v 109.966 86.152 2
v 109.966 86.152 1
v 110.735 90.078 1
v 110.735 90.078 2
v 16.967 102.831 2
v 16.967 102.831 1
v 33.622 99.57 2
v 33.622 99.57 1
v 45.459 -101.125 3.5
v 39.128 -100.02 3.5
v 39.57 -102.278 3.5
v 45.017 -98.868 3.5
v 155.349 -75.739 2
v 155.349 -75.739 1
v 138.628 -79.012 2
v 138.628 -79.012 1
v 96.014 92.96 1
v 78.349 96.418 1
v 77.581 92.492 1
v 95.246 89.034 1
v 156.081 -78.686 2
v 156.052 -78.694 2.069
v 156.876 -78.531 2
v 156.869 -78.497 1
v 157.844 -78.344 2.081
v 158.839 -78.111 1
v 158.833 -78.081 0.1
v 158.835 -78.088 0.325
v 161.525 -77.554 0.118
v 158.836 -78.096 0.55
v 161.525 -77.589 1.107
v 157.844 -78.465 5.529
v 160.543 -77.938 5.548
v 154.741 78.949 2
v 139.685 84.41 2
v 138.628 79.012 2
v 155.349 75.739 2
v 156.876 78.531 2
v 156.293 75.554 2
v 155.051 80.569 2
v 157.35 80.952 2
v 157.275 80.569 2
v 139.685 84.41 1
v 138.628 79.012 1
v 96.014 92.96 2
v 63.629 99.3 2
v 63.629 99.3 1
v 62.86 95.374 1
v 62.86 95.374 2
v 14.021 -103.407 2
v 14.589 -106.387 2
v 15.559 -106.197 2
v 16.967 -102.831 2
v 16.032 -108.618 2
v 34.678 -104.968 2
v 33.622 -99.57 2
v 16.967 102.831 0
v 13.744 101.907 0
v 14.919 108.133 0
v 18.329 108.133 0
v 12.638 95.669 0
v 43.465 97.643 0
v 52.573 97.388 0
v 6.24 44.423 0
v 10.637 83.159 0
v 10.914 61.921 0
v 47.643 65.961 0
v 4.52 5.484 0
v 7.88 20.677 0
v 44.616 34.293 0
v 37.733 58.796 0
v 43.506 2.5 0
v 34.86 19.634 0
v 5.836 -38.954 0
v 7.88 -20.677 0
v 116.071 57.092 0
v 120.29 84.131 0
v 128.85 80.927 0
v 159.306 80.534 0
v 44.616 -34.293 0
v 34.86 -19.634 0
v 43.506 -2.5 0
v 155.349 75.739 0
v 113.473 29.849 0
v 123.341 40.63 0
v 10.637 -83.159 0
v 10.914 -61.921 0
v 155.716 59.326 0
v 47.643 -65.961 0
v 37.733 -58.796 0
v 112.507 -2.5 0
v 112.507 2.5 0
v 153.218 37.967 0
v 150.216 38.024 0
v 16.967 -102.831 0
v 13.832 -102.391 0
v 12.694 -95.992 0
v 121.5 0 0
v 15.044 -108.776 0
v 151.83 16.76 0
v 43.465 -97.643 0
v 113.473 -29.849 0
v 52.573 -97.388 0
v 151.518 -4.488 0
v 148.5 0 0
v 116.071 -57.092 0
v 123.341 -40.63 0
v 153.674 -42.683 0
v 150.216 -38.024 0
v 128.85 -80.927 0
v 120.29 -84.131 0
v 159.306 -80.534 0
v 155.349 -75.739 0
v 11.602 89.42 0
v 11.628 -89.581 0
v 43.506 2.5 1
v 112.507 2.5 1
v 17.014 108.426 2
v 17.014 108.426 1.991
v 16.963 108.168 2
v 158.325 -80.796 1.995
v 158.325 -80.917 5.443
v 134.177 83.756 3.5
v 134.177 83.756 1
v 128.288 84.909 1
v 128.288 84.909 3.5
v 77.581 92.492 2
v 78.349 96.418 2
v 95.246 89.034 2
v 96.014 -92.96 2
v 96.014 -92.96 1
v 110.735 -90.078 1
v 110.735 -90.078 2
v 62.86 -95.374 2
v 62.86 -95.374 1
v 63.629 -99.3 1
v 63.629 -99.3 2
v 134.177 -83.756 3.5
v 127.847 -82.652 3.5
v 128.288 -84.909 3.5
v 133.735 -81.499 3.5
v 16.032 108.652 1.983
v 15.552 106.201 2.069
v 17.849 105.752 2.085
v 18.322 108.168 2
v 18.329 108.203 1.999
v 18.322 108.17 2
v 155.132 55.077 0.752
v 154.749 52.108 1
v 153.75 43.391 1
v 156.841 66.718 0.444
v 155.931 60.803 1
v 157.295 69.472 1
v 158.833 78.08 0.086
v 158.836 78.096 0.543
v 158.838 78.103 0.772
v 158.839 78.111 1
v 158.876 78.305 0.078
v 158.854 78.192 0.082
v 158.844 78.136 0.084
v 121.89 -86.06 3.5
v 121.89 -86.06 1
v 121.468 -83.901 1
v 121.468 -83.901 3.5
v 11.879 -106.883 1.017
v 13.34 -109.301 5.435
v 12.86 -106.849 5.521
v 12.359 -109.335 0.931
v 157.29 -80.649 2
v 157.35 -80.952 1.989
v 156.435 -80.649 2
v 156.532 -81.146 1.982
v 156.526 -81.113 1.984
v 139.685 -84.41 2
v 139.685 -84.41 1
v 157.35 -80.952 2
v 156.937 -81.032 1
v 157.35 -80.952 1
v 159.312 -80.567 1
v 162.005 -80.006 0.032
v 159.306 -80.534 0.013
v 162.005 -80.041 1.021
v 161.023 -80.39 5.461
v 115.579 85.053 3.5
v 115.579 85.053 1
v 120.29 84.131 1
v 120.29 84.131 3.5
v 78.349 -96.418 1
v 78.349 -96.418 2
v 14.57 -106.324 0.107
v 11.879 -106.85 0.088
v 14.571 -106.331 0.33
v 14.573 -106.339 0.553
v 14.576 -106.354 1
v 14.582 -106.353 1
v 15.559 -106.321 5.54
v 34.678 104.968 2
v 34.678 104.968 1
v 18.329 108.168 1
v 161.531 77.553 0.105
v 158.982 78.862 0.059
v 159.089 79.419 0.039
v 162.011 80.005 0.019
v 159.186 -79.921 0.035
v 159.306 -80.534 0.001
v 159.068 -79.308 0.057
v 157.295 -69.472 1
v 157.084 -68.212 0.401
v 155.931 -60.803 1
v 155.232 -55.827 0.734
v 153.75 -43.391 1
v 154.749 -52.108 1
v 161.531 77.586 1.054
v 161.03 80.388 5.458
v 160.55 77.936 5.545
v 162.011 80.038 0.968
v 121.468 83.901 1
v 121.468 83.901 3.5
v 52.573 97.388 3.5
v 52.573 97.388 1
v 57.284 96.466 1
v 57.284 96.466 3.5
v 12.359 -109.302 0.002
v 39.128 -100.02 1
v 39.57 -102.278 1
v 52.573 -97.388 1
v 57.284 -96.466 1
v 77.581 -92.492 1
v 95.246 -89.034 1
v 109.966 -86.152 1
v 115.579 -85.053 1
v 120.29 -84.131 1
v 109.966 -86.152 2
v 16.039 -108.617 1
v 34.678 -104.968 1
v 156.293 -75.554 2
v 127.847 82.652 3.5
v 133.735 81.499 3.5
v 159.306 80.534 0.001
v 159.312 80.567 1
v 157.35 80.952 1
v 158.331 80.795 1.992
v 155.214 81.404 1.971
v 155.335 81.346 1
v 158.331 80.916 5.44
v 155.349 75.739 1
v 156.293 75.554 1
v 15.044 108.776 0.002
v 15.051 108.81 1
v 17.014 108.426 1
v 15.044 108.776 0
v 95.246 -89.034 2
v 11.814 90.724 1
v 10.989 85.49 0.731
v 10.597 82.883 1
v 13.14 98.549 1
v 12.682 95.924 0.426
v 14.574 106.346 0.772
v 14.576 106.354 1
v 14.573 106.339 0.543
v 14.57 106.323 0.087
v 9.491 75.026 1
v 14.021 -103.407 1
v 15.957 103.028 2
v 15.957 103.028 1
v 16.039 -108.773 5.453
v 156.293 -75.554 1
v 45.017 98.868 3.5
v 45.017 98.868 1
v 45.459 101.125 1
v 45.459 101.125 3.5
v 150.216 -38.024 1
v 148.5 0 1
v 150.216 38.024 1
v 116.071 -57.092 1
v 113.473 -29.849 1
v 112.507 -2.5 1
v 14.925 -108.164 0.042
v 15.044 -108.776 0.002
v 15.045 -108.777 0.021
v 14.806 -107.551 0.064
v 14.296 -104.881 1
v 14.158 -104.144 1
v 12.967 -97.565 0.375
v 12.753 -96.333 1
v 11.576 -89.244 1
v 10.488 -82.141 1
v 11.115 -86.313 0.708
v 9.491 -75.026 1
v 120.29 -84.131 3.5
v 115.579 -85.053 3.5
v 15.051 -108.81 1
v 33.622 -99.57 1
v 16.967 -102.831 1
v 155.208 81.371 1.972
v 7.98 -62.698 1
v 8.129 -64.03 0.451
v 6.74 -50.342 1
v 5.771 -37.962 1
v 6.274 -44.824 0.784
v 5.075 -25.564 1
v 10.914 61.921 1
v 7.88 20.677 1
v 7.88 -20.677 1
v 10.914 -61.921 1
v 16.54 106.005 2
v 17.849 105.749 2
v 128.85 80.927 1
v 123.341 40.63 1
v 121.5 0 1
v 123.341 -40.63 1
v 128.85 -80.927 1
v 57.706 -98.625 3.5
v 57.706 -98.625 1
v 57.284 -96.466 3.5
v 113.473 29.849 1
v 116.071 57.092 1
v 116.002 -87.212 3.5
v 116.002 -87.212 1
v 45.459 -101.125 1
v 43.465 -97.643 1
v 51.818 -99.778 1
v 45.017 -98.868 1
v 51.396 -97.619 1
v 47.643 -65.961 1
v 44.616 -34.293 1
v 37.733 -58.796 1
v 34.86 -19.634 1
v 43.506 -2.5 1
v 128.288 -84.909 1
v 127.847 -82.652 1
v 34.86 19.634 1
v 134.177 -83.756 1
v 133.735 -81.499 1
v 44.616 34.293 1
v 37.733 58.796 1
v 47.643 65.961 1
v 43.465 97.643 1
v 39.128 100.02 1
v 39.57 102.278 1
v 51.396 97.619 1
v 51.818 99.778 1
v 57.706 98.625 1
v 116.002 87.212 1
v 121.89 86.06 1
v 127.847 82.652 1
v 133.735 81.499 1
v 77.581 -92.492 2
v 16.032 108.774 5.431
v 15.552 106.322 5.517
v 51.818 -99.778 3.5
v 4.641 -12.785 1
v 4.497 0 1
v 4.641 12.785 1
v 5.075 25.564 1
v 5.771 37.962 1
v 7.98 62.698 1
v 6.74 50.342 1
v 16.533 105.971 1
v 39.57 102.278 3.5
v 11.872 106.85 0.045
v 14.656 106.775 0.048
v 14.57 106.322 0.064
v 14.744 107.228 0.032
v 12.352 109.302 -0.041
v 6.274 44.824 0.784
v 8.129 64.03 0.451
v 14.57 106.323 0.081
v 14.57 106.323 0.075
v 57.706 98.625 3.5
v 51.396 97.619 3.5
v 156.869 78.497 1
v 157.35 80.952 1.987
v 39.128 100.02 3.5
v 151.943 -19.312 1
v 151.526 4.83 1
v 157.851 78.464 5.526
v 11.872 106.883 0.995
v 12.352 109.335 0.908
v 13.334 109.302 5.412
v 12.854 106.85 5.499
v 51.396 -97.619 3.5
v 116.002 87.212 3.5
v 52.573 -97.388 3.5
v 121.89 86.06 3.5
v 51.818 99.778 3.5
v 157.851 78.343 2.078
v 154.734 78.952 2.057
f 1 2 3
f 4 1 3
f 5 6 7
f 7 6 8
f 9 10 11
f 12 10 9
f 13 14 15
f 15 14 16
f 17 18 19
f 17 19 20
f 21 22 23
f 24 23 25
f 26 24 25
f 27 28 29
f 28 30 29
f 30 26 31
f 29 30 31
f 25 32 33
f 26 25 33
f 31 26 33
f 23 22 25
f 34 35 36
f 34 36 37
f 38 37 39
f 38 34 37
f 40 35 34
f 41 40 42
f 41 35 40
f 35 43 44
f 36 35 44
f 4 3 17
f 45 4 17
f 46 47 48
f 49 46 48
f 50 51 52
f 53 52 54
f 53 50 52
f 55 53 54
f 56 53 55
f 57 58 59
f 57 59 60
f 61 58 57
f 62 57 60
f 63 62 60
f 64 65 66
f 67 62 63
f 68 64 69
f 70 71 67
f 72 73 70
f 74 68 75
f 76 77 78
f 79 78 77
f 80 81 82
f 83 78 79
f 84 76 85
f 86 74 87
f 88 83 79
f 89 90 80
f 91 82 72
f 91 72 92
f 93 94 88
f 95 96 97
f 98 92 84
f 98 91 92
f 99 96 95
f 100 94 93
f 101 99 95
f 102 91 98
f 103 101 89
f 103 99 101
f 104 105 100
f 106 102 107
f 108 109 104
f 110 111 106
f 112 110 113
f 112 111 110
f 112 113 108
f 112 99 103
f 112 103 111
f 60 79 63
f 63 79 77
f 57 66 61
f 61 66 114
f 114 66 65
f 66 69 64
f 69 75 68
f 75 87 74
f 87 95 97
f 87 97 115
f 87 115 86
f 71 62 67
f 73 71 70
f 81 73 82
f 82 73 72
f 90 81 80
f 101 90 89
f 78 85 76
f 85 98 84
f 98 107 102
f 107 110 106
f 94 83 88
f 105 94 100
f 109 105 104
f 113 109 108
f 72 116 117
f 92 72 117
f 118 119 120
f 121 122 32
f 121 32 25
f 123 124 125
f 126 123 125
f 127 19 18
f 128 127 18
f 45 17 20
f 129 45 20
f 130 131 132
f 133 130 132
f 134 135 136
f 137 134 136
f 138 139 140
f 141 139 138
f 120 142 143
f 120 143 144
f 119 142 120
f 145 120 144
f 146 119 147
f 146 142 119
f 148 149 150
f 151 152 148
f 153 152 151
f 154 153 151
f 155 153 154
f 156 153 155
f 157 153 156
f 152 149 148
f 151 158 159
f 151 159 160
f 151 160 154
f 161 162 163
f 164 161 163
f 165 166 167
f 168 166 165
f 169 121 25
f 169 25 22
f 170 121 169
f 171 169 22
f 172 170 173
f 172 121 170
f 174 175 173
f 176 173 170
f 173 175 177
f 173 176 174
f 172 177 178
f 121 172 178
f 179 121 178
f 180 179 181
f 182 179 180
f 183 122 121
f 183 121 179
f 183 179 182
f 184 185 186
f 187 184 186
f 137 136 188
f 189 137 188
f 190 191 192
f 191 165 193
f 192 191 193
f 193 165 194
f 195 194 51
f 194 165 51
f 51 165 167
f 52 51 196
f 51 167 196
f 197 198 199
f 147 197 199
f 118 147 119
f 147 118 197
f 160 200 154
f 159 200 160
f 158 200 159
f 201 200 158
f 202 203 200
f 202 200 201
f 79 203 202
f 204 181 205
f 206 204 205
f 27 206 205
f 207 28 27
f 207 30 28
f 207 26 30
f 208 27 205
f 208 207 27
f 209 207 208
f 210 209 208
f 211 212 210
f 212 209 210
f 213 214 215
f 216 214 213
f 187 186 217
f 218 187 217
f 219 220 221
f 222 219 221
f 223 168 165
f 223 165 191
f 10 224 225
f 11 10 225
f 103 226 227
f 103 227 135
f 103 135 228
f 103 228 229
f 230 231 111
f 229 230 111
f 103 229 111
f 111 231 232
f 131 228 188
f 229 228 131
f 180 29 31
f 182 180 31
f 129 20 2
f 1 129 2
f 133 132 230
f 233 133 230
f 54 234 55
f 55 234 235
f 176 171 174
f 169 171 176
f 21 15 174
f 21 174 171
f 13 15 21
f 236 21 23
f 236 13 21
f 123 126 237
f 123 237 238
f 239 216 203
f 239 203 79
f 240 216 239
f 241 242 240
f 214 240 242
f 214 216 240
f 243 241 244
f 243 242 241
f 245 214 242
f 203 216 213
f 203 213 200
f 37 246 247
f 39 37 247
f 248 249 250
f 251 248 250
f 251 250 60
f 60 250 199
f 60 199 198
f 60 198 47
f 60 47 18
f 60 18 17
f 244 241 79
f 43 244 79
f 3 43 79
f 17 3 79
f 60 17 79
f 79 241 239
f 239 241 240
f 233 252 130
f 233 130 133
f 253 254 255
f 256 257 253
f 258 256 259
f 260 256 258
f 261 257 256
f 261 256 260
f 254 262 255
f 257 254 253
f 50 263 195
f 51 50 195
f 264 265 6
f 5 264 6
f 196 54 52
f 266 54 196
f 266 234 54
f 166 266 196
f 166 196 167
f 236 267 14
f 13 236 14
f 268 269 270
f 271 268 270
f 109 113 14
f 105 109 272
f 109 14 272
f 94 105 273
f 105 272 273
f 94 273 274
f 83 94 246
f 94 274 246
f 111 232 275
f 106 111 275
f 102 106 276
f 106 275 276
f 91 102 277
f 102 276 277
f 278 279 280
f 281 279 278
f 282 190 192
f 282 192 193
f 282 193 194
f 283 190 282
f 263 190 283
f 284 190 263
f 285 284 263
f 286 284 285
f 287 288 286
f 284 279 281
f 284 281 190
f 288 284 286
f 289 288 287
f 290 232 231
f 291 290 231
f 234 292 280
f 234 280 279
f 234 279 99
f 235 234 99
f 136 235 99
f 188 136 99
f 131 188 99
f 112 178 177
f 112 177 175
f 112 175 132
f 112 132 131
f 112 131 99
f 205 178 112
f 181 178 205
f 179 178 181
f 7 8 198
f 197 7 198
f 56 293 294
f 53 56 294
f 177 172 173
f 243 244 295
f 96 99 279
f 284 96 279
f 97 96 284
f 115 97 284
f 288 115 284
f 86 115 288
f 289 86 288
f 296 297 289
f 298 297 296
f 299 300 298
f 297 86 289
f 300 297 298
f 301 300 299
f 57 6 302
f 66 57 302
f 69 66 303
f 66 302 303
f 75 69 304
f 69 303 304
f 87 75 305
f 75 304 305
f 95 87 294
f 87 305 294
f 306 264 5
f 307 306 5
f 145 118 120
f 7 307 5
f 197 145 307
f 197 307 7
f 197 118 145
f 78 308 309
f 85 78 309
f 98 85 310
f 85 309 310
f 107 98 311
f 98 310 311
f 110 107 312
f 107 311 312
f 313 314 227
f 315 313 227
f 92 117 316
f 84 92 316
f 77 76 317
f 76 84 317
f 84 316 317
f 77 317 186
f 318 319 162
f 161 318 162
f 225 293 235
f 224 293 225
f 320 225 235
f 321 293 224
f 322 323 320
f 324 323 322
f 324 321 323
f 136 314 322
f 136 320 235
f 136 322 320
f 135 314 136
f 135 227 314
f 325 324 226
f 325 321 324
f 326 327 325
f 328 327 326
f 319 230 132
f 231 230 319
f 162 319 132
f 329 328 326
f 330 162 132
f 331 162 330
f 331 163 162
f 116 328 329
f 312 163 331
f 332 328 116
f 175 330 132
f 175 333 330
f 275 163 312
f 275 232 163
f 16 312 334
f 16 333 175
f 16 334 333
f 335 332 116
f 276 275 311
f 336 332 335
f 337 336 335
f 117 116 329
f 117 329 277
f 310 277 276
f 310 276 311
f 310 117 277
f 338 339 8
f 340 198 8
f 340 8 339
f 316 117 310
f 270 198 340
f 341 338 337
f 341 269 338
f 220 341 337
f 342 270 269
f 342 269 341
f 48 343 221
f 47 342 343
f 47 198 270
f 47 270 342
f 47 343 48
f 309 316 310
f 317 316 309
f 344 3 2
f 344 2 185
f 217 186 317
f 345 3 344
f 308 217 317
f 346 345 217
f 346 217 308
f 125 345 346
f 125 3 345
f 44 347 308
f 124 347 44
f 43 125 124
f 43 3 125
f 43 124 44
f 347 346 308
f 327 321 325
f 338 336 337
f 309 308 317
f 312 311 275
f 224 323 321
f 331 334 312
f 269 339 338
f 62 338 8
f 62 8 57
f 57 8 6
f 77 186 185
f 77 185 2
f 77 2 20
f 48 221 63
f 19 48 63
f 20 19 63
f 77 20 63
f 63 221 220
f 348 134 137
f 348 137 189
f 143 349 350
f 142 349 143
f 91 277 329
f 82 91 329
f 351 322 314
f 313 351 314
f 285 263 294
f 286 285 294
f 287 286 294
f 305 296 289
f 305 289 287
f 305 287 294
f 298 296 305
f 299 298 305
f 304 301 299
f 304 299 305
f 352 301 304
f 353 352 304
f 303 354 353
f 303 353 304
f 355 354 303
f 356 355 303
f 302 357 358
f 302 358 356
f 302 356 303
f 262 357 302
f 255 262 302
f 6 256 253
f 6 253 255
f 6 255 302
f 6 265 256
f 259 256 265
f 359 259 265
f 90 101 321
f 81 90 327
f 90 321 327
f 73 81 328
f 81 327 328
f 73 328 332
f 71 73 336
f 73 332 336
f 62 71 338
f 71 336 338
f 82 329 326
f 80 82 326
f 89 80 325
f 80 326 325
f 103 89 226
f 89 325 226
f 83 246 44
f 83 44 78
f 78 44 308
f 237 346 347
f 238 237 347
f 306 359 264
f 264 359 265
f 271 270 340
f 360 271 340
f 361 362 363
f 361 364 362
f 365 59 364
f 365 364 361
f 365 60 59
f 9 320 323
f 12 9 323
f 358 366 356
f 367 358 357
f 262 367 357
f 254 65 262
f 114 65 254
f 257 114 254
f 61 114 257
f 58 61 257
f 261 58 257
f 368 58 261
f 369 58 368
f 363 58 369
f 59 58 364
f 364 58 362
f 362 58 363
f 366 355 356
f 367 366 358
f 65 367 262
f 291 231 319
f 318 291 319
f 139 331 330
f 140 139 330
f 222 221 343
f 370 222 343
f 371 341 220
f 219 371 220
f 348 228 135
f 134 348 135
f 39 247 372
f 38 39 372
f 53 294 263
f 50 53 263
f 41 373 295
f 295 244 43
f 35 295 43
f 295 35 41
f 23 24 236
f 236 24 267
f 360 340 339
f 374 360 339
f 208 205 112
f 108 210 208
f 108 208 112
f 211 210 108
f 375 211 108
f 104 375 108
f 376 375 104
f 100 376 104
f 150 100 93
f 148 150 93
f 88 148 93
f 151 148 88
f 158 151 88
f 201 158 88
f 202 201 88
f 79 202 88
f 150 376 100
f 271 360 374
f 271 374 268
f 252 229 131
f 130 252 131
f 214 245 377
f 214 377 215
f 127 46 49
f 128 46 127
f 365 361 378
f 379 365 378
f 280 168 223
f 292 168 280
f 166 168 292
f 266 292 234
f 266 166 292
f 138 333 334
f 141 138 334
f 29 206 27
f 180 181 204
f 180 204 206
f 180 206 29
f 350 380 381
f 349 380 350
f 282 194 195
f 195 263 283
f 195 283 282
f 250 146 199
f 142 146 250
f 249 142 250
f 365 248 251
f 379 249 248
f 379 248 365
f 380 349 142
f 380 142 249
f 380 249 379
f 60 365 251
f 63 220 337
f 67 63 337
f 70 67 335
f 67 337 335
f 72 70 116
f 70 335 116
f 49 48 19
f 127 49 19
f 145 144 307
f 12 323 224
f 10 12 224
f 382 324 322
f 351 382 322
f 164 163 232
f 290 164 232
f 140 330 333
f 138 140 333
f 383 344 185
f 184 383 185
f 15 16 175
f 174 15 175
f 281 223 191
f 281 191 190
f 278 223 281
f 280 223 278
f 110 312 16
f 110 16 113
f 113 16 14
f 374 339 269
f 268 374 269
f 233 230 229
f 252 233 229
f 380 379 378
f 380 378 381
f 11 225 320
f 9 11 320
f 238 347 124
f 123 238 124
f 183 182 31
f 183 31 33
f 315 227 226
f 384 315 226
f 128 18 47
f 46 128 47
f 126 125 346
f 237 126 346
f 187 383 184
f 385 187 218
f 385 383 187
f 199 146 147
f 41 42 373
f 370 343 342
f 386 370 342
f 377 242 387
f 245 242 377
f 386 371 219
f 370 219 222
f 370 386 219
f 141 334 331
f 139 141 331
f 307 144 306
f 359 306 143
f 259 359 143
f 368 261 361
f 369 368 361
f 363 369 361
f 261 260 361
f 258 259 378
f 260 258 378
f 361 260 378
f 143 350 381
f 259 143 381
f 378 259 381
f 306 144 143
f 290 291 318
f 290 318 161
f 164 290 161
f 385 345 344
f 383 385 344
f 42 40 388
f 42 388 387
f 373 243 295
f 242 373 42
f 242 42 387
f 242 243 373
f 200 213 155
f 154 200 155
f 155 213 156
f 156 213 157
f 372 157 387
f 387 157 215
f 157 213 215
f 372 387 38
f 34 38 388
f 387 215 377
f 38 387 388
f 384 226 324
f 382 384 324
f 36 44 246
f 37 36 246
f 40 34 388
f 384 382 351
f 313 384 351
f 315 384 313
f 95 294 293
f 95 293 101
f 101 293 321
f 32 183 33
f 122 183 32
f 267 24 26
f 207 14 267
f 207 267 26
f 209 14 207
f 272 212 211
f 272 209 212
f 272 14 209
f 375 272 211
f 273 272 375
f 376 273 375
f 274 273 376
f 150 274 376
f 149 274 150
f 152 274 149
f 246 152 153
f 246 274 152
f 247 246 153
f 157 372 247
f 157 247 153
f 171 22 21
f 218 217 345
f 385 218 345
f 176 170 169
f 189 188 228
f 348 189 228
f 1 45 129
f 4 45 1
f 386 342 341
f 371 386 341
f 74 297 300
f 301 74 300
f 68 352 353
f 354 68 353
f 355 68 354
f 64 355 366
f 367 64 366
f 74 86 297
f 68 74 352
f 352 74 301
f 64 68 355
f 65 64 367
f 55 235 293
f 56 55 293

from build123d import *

# Parameters (mm, degrees)
F1_ANGLE_BACK = 11.25
F1_ANGLE      = 22.5
F2_W          = 174.6602954563
F2_H          = 13.9838710204
F2_W_2        = 174.5945907282
F2_H_2        = 12.7738052979
F3_DEPTH      = 125
F5_DEPTH      = 1.001
F7_DEPTH      = 2.5
F9_DEPTH      = 1
F11_DEPTH     = 2.5
F13_DEPTH     = 2.5


with BuildPart() as f1:
    # F0 (on Front) → F1 (revolve)
    with BuildSketch(Plane.XZ, mode=Mode.PRIVATE) as f1_sk:
        Polygon((4.5, 1.8972494266), (151.4991241063, 1.4046487898), (151.5292833394, 10.4045982575), (4.530159233, 10.8971988943), align=None)
        Polygon((151.4689648733, -7.5953006778), (151.4991241063, 1.4046487898), (4.5, 1.8972494266), (4.4973410418, 1.1037780134), (51.0110905605, -7.2586618498), align=None)
        Polygon((4.469840767, -7.102700041), (51.0110905605, -7.2586618498), (4.4973410418, 1.1037780134), align=None)
    revolve(f1_sk.sketch.rotate(Axis((561.8991869329, 0, -48.7660320647), (-0.176947319, 0, -0.9842203241)), -F1_ANGLE_BACK), axis=Axis((561.8991869329, 0, -48.7660320647), (-0.176947319, 0, -0.9842203241)), revolution_arc=F1_ANGLE)

    # F2 (on Front) → F3 (cut, symmetric)
    with BuildSketch(Plane.XZ):
        with Locations((82.9434095772, 7.9919355102)):
            Rectangle(F2_W, F2_H)
        with Locations((82.9762619412, -6.386902649)):
            Rectangle(F2_W_2, F2_H_2)
    extrude(amount=F3_DEPTH, both=True, mode=Mode.SUBTRACT)

    # F4 (on face) → F5 (cut, through all)
    with BuildSketch(Plane.XY.offset(1)):
        with BuildLine():
            Line((43.4654092359, 97.642850746), (16.9671003359, 102.8305199324))
            ThreePointArc((16.9671003359, 102.8305199324), (7.5, 0), (16.9671003359, -102.8305199324))
            Line((16.9671003359, -102.8305199324), (43.4654092359, -97.642850746))
            ThreePointArc((43.4654092359, -97.642850746), (34.5, 0), (43.4654092359, 97.642850746))
        make_face()
        with BuildLine():
            Line((120.2899679019, 84.1311059323), (52.5732132725, 97.3882584065))
            ThreePointArc((52.5732132725, 97.3882584065), (45.8906345723, 50.1494761623), (43.5059275751, 2.5))
            Line((43.5059275751, 2.5), (112.5068202166, 2.5))
            ThreePointArc((112.5068202166, 2.5), (114.5685951129, 43.4900158167), (120.2899679019, 84.1311059323))
        make_face()
        with BuildLine():
            Line((112.5068202166, -2.5), (43.5059275751, -2.5))
            ThreePointArc((43.5059275751, -2.5), (45.8906345723, -50.1494761623), (52.5732132725, -97.3882584065))
            Line((52.5732132725, -97.3882584065), (120.2899679019, -84.1311059323))
            ThreePointArc((120.2899679019, -84.1311059323), (114.5685951129, -43.4900158167), (112.5068202166, -2.5))
        make_face()
        with BuildLine():
            Line((155.3490104822, 75.7389959439), (128.8499233765, 80.9268174824))
            ThreePointArc((128.8499233765, 80.9268174824), (121.5, 0), (128.8499233765, -80.9268174824))
            Line((128.8499233765, -80.9268174824), (155.3490104822, -75.7389959439))
            ThreePointArc((155.3490104822, -75.7389959439), (148.5, 0), (155.3490104822, 75.7389959439))
        make_face()
    extrude(amount=-F5_DEPTH, mode=Mode.SUBTRACT)

    # F6 (on face) → F7 (join)
    with BuildSketch(Plane.XY.offset(1)):
        Polygon((45.0166627785, 98.8676314601), (45.4585534309, 101.1247829063), (39.5703322667, 102.2775411299), (39.1284416144, 100.0203896837), align=None)
        Polygon((52.5732132725, 97.3882584065), (57.2837902038, 96.4660518276), (57.7064682191, 98.6250662544), (51.818247055, 99.777824478), (51.3955690397, 97.6188100512), align=None)
        Polygon((116.0020689859, 87.2123269381), (115.5793909706, 85.0533125112), (120.2899679019, 84.1311059323), (121.4676121347, 83.9005542876), (121.8902901501, 86.0595687145), align=None)
        Polygon((128.2884090483, 84.908884325), (127.8465183959, 82.6517328787), (133.7347395601, 81.4989746551), (134.1766302124, 83.7561261014), align=None)
        Polygon((120.2899679019, -84.1311059323), (115.5793909706, -85.0533125112), (116.0020689859, -87.2123269381), (121.8902901501, -86.0595687145), (121.4676121347, -83.9005542876), align=None)
        Polygon((133.7347395601, -81.4989746551), (127.8465183959, -82.6517328787), (128.2884090483, -84.908884325), (134.1766302124, -83.7561261014), align=None)
        Polygon((45.4585534309, -101.1247829063), (45.0166627785, -98.8676314601), (39.1284416144, -100.0203896837), (39.5703322667, -102.2775411299), align=None)
        Polygon((57.7064682191, -98.6250662544), (57.2837902038, -96.4660518276), (52.5732132725, -97.3882584065), (51.3955690397, -97.6188100512), (51.818247055, -99.777824478), align=None)
    extrude(amount=F7_DEPTH)

    # F8 (on face) → F9 (join)
    with BuildSketch(Plane.XY.offset(1)):
        Polygon((34.6784961674, 104.9675053569), (17.0138326749, 108.4257800277), (15.9571376366, 103.0282439606), (16.9671003359, 102.8305199324), (33.6218011291, 99.5699692898), align=None)
        Polygon((78.3494698015, 96.4178818652), (63.6289168911, 99.2997774242), (62.8604114087, 95.3742966481), (77.5809643191, 92.4924010891), align=None)
        Polygon((110.7346862043, 90.0777116354), (96.0141332939, 92.9596071944), (95.2456278115, 89.0341264183), (109.9661807219, 86.1522308593), align=None)
        Polygon((157.3497208298, 80.9517187405), (139.6850573373, 84.4099934113), (138.628362299, 79.0124573441), (155.3490104822, 75.7389959439), (156.2930257915, 75.5541826733), align=None)
        Polygon((156.2930257915, -75.5541826733), (155.3490104822, -75.7389959439), (138.628362299, -79.0124573441), (139.6850573373, -84.4099934113), (157.3497208298, -80.9517187405), align=None)
        Polygon((95.2455782208, -89.0341361269), (96.0140837032, -92.959616903), (110.7346366136, -90.077721344), (109.9661311312, -86.1522405679), align=None)
        Polygon((62.860361818, -95.3743063567), (63.6288673004, -99.2997871328), (78.3494202108, -96.4178915738), (77.5809147284, -92.4924107977), align=None)
        Polygon((16.9671003359, -102.8305199324), (14.0205764212, -103.407371511), (15.0510922869, -108.8100327689), (34.6784961674, -104.9675053569), (33.6218011291, -99.5699692898), align=None)
    extrude(amount=F9_DEPTH)

    # F10 (on face) → F11 (join)
    with BuildSketch(Plane(origin=(21.0396507867, -107.4692979953, -3.7825979687), x_dir=(0.9813926052, 0.1918930354, 0.0067540611), z_dir=(0.19201186, -0.9807852804, -0.0345207094))):
        Polygon((-8.8453486731, 3.8468765561), (-6.1087279224, 3.8468765561), (-6.1021027342, 4.826798959), (-5.0953486731, 4.81999507), (-5.0953486731, 5.8261801192), (-5.0953486731, 9.2761801192), (-7.8453486731, 9.2761801192), (-8.8453486731, 4.7761801192), align=None)
        Polygon((-6.1021027342, 4.826798959), (-6.1087279224, 3.8468765561), (-5.0953486731, 3.8468765561), (-5.0953486731, 4.81999507), align=None)
        Polygon((140.8944898216, 3.8333602109), (140.8878160856, 2.8462571659), (143.6378160856, 2.8462571659), (143.6378160856, 3.835607484), (142.6378160856, 8.285607484), (139.8878160856, 8.285607484), (139.8878160856, 4.835607484), (138.0617320538, 4.835607484), (138.474456915, 3.8497153822), (138.8945354939, 3.846876389), align=None)
        Polygon((138.8945354939, 2.8462571659), (140.8878160856, 2.8462571659), (140.8944898216, 3.8333602109), (138.8945354939, 3.846876389), (138.474456915, 3.8497153822), align=None)
    extrude(amount=-F11_DEPTH)

    # F12 (on face) → F13 (join)
    with BuildSketch(Plane(origin=(21.0396507867, 107.4692979953, -3.7825979687), x_dir=(-0.9813926052, 0.1918930354, -0.0067540611), z_dir=(0.19201186, 0.9807852804, -0.0345207094))):
        Polygon((6.1088675431, 3.8262254542), (2.7622254557, 3.8036080325), (4.8167226223, 3.8036080325), (6.1021027342, 3.8036080325), (8.8521027342, 3.8036080325), (8.8521027342, 4.7536080325), (7.8521027342, 9.2536080325), (5.1021027342, 9.2536080325), (5.1021027342, 5.8036080325), (2.7622254557, 5.8036080325), (2.7622254557, 4.8042272555), (4.1021484065, 4.8132827809), (6.1021027342, 4.826798959), align=None)
        Polygon((2.7622254557, 4.8042272555), (2.7622254557, 3.8036080325), (6.1088675431, 3.8262254542), (6.1021027342, 4.826798959), (4.1021484065, 4.8132827809), align=None)
        Polygon((-143.6444898216, 2.832786706), (-140.8877250128, 2.832786706), (-140.8944898216, 3.8333602109), (-138.8945354939, 3.846876389), (-136.8420855995, 3.8607473449), (-136.7184351443, 4.832786706), (-139.8944898216, 4.832786706), (-139.8944898216, 8.282786706), (-142.6444898216, 8.282786706), (-143.6444898216, 3.782786706), align=None)
        Polygon((-140.8944898216, 3.8333602109), (-140.8877250128, 2.832786706), (-136.969481142, 2.8592671517), (-136.8420855995, 3.8607473449), (-138.8945354939, 3.846876389), align=None)
    extrude(amount=-F13_DEPTH)


solid = f1.part
